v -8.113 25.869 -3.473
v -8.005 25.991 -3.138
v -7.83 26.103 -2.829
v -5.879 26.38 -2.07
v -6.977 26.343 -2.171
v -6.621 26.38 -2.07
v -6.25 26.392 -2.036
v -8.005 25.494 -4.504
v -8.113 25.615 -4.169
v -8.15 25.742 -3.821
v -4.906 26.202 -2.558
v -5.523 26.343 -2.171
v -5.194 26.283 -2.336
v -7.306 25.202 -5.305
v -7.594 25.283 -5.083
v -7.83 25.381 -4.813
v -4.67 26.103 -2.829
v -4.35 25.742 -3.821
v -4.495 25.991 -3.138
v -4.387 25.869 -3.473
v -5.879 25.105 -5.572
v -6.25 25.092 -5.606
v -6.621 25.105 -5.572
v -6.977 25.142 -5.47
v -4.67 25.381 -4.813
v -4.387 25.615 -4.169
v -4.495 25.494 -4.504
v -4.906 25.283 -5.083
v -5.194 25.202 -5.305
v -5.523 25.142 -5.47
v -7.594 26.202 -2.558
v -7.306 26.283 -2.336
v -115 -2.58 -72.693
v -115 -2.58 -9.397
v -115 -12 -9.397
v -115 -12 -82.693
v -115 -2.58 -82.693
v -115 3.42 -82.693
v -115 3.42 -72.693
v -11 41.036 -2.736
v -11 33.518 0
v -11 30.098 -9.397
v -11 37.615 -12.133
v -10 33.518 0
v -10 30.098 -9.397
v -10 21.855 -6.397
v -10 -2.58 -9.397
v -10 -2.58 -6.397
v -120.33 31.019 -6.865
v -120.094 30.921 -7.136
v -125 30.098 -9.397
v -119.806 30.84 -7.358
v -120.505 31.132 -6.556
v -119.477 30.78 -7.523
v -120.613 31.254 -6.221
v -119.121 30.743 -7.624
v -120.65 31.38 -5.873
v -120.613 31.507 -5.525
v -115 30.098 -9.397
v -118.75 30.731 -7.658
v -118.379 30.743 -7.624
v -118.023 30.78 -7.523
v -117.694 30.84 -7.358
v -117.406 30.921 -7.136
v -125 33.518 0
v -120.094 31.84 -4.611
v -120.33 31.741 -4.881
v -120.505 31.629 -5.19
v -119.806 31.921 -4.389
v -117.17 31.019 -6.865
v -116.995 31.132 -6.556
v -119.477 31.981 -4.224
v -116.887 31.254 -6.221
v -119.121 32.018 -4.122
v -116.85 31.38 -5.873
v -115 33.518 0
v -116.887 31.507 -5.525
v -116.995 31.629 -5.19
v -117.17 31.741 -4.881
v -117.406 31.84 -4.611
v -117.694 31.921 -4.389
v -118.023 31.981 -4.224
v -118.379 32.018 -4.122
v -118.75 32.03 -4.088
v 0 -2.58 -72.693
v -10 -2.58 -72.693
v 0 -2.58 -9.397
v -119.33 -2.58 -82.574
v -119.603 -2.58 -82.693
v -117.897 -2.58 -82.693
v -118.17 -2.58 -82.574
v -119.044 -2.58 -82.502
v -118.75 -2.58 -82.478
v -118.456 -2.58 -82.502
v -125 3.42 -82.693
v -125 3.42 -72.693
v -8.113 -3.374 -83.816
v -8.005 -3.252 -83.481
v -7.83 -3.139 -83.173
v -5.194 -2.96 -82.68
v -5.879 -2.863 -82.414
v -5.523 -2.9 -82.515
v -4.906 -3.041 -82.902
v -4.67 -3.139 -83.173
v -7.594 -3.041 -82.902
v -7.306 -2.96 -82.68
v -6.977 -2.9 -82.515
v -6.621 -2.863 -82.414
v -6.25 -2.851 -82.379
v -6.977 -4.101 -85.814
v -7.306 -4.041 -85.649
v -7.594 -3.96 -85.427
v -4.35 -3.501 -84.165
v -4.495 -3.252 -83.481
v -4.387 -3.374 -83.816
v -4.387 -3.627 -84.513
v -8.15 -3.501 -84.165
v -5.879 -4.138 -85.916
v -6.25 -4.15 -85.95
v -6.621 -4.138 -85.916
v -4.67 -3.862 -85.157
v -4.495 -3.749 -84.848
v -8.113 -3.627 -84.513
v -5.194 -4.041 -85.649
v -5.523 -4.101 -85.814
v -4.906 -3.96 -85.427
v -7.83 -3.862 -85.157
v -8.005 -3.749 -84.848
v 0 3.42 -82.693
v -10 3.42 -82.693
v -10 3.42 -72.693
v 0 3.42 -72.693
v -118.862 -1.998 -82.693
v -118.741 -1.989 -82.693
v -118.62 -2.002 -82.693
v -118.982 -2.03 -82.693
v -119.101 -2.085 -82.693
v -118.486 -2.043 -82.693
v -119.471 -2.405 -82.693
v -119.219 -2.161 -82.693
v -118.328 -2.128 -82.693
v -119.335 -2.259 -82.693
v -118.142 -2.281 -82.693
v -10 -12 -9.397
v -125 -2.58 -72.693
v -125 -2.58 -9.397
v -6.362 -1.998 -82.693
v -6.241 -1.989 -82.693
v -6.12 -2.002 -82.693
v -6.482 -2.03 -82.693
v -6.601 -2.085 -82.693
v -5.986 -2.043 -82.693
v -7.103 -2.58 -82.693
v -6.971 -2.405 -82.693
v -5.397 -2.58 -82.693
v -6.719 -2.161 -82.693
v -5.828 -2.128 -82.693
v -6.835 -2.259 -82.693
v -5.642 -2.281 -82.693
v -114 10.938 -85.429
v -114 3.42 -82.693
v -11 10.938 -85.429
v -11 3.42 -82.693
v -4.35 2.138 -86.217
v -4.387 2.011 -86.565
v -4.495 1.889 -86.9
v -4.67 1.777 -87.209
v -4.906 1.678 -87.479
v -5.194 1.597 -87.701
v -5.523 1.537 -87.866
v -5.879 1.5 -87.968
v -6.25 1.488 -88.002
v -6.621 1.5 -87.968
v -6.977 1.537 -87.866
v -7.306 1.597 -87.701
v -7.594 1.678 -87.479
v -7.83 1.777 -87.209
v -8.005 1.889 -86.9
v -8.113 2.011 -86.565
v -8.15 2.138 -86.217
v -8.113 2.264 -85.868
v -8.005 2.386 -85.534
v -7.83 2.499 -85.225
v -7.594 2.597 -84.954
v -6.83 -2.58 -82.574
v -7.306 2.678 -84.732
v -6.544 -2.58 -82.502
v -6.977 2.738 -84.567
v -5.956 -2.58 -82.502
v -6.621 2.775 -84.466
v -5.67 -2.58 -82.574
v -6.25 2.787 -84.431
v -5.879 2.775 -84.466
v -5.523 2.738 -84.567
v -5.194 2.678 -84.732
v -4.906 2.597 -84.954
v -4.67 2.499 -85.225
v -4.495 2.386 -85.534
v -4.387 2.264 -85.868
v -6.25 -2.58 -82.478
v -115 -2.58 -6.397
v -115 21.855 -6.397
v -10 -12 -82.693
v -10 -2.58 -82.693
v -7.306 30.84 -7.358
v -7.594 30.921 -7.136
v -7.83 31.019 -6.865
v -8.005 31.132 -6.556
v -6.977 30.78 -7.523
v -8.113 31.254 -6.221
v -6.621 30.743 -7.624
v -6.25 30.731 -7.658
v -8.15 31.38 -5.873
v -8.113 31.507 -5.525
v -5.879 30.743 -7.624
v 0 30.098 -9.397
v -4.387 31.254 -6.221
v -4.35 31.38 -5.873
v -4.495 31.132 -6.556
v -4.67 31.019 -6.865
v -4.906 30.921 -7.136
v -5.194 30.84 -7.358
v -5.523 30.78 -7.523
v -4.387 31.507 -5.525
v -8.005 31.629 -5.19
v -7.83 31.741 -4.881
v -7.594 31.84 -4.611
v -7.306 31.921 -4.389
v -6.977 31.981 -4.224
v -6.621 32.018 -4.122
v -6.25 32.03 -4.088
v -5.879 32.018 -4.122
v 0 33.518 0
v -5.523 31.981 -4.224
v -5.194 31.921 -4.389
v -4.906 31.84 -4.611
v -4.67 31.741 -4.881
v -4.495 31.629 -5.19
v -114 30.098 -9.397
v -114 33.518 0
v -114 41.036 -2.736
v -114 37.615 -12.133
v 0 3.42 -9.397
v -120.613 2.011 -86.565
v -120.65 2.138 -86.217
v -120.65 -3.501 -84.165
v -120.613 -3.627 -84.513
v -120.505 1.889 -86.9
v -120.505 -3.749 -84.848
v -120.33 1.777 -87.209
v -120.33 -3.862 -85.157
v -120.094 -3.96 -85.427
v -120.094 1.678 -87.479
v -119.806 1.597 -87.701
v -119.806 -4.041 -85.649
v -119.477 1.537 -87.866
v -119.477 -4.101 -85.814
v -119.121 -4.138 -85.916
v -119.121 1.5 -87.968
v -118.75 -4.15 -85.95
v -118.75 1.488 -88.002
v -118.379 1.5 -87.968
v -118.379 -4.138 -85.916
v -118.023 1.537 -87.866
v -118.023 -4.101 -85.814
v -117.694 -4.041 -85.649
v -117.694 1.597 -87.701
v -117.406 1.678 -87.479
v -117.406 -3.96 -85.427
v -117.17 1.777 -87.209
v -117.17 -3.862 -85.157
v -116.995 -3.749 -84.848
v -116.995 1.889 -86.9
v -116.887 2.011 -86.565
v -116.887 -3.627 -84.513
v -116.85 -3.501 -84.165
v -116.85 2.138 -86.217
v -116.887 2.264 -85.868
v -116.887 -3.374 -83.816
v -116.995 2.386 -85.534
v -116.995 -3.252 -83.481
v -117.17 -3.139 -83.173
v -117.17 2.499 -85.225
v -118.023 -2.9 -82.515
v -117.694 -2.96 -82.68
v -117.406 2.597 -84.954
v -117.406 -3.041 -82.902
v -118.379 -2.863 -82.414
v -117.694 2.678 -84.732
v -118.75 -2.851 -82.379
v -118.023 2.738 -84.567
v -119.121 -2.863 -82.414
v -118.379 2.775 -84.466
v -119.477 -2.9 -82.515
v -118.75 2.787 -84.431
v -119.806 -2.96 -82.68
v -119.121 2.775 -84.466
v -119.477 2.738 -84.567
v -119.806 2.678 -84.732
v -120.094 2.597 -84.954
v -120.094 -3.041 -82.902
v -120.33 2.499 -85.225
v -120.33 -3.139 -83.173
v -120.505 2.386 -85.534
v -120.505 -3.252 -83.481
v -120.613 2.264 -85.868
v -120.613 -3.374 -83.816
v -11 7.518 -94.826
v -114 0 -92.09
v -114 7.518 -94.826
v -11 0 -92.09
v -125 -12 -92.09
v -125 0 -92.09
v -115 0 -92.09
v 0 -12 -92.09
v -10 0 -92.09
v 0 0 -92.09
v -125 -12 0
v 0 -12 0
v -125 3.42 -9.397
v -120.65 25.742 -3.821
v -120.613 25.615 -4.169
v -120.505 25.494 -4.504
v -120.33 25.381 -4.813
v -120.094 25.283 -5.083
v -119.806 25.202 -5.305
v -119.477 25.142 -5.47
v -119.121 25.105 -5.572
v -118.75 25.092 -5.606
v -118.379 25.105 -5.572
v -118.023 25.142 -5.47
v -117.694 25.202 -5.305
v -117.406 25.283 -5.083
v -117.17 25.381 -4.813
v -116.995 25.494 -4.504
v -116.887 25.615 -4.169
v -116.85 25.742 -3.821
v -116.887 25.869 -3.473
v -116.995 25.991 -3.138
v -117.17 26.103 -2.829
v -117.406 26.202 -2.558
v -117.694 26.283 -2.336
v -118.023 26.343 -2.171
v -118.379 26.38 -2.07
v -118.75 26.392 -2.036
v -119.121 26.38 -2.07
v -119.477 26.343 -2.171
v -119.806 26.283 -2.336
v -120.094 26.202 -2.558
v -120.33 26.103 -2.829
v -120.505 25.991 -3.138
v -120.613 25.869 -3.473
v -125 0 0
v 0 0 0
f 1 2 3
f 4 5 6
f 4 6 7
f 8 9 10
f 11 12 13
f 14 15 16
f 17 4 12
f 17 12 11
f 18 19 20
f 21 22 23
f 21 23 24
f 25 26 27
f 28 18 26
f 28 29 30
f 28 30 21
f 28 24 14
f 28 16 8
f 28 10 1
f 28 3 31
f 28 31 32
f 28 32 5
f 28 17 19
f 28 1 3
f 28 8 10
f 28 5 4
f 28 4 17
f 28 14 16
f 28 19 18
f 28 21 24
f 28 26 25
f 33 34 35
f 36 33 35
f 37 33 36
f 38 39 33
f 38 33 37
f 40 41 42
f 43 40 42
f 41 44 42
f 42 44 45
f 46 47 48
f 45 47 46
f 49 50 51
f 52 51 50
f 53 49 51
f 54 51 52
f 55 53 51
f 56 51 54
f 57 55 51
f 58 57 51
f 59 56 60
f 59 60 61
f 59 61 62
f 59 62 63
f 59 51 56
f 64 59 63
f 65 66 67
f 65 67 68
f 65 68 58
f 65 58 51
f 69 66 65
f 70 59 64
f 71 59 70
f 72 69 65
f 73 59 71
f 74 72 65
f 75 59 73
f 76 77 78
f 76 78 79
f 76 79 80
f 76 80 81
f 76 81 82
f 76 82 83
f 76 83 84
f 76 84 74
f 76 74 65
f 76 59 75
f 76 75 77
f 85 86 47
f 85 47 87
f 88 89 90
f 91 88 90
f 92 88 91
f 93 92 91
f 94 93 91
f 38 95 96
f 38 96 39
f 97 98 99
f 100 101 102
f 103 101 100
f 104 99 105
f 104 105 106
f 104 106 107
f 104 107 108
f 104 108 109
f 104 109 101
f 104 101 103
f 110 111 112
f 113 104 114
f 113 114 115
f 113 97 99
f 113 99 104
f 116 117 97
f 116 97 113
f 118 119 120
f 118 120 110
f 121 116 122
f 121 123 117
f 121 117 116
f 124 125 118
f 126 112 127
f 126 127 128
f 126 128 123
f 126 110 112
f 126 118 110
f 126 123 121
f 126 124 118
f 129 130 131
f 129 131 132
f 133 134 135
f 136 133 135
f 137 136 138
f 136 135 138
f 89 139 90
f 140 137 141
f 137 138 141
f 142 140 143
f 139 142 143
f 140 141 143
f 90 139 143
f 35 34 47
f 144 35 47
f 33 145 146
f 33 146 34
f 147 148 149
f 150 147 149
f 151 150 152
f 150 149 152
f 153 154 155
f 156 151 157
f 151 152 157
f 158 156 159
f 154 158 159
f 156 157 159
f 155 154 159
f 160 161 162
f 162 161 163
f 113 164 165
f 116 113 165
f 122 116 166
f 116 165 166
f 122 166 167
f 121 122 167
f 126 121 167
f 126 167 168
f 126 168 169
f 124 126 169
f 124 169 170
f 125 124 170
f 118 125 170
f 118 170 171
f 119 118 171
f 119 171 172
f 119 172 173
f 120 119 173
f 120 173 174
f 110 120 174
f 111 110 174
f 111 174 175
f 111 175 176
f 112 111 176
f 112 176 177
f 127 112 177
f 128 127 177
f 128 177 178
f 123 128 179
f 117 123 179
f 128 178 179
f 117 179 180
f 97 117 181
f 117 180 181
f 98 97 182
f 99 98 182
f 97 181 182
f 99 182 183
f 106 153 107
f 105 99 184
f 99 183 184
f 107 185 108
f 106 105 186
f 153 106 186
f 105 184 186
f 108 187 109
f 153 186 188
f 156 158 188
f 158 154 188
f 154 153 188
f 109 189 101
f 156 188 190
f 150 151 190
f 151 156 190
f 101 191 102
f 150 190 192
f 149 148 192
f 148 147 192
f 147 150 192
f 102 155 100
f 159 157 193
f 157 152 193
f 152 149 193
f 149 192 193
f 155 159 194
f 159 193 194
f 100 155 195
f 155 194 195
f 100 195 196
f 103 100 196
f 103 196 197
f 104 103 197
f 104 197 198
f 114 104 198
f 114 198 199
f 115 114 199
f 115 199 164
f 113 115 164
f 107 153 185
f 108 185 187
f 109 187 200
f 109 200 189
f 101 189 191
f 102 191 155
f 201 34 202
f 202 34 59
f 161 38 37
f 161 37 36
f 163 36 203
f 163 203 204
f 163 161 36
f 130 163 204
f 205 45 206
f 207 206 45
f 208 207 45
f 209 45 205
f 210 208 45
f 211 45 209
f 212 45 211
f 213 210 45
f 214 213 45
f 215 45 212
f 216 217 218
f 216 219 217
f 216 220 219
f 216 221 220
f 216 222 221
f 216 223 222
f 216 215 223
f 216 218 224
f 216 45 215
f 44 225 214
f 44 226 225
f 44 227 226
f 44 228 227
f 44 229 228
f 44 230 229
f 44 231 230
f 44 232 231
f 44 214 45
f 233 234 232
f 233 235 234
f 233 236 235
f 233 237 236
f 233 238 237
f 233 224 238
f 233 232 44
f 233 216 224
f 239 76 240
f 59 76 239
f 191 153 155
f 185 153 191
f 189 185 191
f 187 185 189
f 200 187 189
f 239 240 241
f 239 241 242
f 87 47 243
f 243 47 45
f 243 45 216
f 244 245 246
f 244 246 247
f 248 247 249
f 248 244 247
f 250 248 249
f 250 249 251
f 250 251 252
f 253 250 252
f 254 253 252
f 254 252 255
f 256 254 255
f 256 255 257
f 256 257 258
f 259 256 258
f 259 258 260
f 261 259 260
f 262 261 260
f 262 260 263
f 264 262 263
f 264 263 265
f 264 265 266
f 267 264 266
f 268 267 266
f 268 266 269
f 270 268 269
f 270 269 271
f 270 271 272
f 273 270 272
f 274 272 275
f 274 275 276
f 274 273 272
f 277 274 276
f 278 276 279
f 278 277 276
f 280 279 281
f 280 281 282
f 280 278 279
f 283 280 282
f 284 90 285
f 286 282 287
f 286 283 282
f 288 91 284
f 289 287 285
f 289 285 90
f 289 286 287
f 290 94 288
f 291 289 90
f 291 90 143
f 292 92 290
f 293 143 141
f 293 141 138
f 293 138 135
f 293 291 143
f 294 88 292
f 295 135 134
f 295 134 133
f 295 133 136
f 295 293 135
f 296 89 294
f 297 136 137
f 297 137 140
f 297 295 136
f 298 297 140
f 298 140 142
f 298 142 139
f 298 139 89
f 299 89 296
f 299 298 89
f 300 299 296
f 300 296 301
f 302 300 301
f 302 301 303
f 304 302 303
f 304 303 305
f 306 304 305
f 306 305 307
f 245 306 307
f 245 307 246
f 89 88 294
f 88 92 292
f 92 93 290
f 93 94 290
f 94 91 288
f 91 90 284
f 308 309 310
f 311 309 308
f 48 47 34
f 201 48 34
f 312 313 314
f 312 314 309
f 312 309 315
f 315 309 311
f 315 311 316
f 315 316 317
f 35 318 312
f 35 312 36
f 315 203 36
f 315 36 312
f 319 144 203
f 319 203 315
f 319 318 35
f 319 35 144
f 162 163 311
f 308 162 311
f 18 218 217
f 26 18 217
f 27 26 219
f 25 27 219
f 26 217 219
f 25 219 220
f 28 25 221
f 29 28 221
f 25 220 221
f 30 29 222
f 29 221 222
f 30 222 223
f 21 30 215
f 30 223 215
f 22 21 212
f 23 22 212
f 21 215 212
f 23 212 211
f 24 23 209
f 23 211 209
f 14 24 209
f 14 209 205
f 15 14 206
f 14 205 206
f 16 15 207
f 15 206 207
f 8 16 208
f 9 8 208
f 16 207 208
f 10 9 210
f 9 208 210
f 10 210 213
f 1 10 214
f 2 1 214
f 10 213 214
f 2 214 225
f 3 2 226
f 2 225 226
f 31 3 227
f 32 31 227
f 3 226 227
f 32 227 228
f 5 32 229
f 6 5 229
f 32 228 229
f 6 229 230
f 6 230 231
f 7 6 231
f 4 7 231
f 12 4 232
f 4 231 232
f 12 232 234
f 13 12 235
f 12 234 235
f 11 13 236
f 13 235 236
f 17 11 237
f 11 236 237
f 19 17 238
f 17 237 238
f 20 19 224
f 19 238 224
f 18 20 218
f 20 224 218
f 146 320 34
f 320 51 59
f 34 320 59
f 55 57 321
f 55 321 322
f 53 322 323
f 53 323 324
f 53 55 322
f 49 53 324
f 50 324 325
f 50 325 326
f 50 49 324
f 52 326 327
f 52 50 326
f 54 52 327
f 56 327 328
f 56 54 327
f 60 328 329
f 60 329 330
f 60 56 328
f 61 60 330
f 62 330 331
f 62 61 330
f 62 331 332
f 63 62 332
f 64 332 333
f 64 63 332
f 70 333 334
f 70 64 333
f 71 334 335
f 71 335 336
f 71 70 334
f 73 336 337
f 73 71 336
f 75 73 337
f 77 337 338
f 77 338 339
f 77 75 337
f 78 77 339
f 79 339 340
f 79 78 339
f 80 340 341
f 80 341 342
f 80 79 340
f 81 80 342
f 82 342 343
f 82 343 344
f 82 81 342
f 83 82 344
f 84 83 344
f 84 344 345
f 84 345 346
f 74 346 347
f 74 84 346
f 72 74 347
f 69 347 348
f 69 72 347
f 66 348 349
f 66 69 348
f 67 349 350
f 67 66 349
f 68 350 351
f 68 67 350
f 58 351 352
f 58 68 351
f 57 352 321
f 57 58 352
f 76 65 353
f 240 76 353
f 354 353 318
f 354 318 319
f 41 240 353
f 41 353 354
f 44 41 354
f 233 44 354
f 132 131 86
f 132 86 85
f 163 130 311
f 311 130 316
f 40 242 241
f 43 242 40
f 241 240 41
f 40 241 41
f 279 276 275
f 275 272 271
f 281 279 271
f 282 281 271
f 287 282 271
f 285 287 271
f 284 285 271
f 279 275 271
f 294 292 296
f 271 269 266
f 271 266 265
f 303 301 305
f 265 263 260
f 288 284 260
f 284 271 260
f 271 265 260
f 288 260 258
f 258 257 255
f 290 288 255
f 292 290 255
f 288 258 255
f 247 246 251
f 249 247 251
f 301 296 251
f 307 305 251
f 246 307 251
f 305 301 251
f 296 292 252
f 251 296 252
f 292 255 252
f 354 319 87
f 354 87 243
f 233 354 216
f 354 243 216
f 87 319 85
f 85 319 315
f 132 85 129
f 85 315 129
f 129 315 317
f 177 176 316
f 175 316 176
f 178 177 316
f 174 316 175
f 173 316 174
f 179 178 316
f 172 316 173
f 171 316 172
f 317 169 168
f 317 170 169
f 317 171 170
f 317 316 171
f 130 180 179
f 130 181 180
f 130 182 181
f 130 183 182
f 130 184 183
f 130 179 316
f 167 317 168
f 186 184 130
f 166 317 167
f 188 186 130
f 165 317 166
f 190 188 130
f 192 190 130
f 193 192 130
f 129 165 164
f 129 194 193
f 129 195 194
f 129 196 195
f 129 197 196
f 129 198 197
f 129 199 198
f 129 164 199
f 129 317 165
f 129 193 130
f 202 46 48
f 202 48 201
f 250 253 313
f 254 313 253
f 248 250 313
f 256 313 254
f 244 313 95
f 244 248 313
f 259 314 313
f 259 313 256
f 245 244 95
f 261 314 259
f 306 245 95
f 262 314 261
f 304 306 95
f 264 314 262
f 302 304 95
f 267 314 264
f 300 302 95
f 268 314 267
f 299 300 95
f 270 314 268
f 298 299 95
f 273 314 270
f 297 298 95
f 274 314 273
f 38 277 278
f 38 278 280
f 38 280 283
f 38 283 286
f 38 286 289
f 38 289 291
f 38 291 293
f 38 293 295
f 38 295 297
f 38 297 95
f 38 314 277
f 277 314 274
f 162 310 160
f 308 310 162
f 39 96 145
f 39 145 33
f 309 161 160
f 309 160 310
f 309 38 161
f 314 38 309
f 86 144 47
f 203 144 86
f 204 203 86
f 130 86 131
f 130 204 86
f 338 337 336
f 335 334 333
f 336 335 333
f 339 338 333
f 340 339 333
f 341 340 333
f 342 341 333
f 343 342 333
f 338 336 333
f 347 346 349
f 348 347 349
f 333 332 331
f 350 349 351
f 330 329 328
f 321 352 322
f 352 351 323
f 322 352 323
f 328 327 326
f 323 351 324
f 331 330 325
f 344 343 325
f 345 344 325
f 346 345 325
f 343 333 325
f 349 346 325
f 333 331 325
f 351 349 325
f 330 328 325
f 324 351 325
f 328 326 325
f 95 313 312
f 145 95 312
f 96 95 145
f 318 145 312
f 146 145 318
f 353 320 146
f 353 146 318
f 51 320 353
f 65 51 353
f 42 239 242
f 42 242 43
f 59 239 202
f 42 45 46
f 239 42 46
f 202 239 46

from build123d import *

# Parameters (mm, degrees)
BOSS_EXTRUDE3_DEPTH  = 125
SKETCH3_W            = 125
SKETCH3_H            = 92.089876837
BOSS_EXTRUDE5_DEPTH  = 12
CUT_EXTRUDE1_DEPTH   = 126
SKETCH7_W            = 105
SKETCH7_H            = 10
BOSS_EXTRUDE6_DEPTH  = 8
SKETCH8_W            = 105
SKETCH8_H            = 10
BOSS_EXTRUDE7_DEPTH  = 8
SKETCH9_W            = 105
SKETCH9_H            = 73.296024421
CUT_EXTRUDE2_DEPTH   = 16.420201433
SKETCH11_W           = 10
SKETCH11_H           = 73.296024421
CUT_EXTRUDE3_DEPTH   = 6
SKETCH12_W           = 10
SKETCH12_H           = 73.296024421
CUT_EXTRUDE4_DEPTH   = 6
SKETCH13_W           = 105
SKETCH13_H           = 32.67757118
CUT_EXTRUDE6_DEPTH   = 3
SKETCH14_R           = 1.9
CUT_EXTRUDE8_DEPTH   = 6
SKETCH15_R           = 1.9
CUT_EXTRUDE9_DEPTH   = 6
BOSS_EXTRUDE9_REACH  = 117
SKETCH25_W           = 10
SKETCH25_H           = 6
BOSS_EXTRUDE13_DEPTH = 10
CUT_EXTRUDE10_DEPTH  = 1
CUT_EXTRUDE11_DEPTH  = 1


with BuildPart() as part:
    # Sketch1 → Boss-Extrude3 (new body)
    with BuildSketch(Plane(origin=(0, 0, 0), x_dir=(0, 0, -1), z_dir=(1, 0, 0))):
        Polygon((0, 0), (92.089876837, 0), (0, 33.517974046), align=None)
    extrude(amount=-BOSS_EXTRUDE3_DEPTH)

    # Sketch3 → Boss-Extrude5 (add)
    with BuildSketch(Plane.XZ):
        with Locations((-62.5, -46.044938419)):
            Rectangle(SKETCH3_W, SKETCH3_H)
    extrude(amount=BOSS_EXTRUDE5_DEPTH)

    # Sketch6 → Cut-Extrude1 (cut, through all)
    with BuildSketch(Plane.ZY.offset(125)):
        Polygon((-9.396926208, 30.097772613), (-82.692950629, 3.420201433), (-9.396926208, 3.420201433), align=None)
    extrude(amount=-CUT_EXTRUDE1_DEPTH, mode=Mode.SUBTRACT)

    # Sketch7 → Boss-Extrude6 (add)
    with BuildSketch(Plane(origin=(0, 29.597115904, -10.772469209), x_dir=(1, 0, 0), z_dir=(0, 0.939692621, -0.342020143))):
        with Locations((-62.5, 81.536177713)):
            Rectangle(SKETCH7_W, SKETCH7_H)
    extrude(amount=BOSS_EXTRUDE6_DEPTH)

    # Sketch8 → Boss-Extrude7 (add)
    with BuildSketch(Plane(origin=(0, 29.597115904, -10.772469209), x_dir=(1, 0, 0), z_dir=(0, 0.939692621, -0.342020143))):
        with Locations((-62.5, -6.463822287)):
            Rectangle(SKETCH8_W, SKETCH8_H)
    extrude(amount=BOSS_EXTRUDE7_DEPTH)

    # Sketch9 → Cut-Extrude2 (cut, through all)
    with BuildSketch(Plane(origin=(0, 3.420201433, 0), x_dir=(1, 0, 0), z_dir=(0, 1, 0))):
        with Locations((-62.5, 46.044938419)):
            Rectangle(SKETCH9_W, SKETCH9_H)
    extrude(amount=-CUT_EXTRUDE2_DEPTH, mode=Mode.SUBTRACT)

    # Sketch11 → Cut-Extrude3 (cut)
    with BuildSketch(Plane(origin=(0, 3.420201433, 0), x_dir=(1, 0, 0), z_dir=(0, 1, 0))):
        with Locations((-5, 46.044938419)):
            Rectangle(SKETCH11_W, SKETCH11_H)
    extrude(amount=-CUT_EXTRUDE3_DEPTH, mode=Mode.SUBTRACT)

    # Sketch12 → Cut-Extrude4 (cut)
    with BuildSketch(Plane(origin=(0, 3.420201433, 0), x_dir=(1, 0, 0), z_dir=(0, 1, 0))):
        with Locations((-120, 46.044938419)):
            Rectangle(SKETCH12_W, SKETCH12_H)
    extrude(amount=-CUT_EXTRUDE4_DEPTH, mode=Mode.SUBTRACT)

    # Sketch13 → Cut-Extrude6 (cut)
    with BuildSketch(Plane(origin=(0, 0, -9.396926208), x_dir=(-1, 0, 0), z_dir=(0, 0, -1))):
        with Locations((62.5, 13.758987023)):
            Rectangle(SKETCH13_W, SKETCH13_H)
    extrude(amount=-CUT_EXTRUDE6_DEPTH, mode=Mode.SUBTRACT)

    # Sketch14 → Cut-Extrude8 (cut)
    with BuildSketch(Plane(origin=(0, 29.597115904, -10.772469209), x_dir=(1, 0, 0), z_dir=(0, 0.939692621, -0.342020143))):
        with Locations((-6.25, 80.286177713)):
            Circle(SKETCH14_R)
    cut_extrude8 = extrude(amount=-CUT_EXTRUDE8_DEPTH, mode=Mode.SUBTRACT)

    # Mirror1: Cut-Extrude8 across plane
    add(cut_extrude8.mirror(Plane(origin=(-62.5, 0, 0), x_dir=(0, 0, 1), z_dir=(1, 0, 0))), mode=Mode.SUBTRACT)

    # Sketch15 → Cut-Extrude9 (cut)
    with BuildSketch(Plane(origin=(0, 29.597115904, -10.772469209), x_dir=(1, 0, 0), z_dir=(0, 0.939692621, -0.342020143))):
        with Locations((-6.25, -5.213822287)):
            Circle(SKETCH15_R)
    cut_extrude9 = extrude(amount=-CUT_EXTRUDE9_DEPTH, mode=Mode.SUBTRACT)

    # Mirror2: Cut-Extrude9 across plane
    add(cut_extrude9.mirror(Plane(origin=(-62.5, 0, 0), x_dir=(0, 0, 1), z_dir=(1, 0, 0))), mode=Mode.SUBTRACT)

    # Sketch22 → Boss-Extrude9 (add, up to next)
    with BuildSketch(Plane.ZY.offset(10), mode=Mode.PRIVATE) as boss_extrude9_sk1:
        Polygon((-9.396926208, 30.097772613), (-6.396926208, 21.855340354), (-6.396926208, 30.097772613), align=None)
    boss_extrude9_tool1 = extrude(boss_extrude9_sk1.sketch, amount=BOSS_EXTRUDE9_REACH, mode=Mode.PRIVATE) - part.part
    add(boss_extrude9_tool1.solids().sort_by_distance((-10, 27.350295, -7.396926))[0])

    # Sketch25 → Boss-Extrude13 (add)
    with BuildSketch(Plane.XY.offset(-82.692950629)):
        with Locations((-5, 0.420201433)):
            Rectangle(SKETCH25_W, SKETCH25_H)
        with Locations((-120, 0.420201433)):
            Rectangle(SKETCH25_W, SKETCH25_H)
    extrude(amount=BOSS_EXTRUDE13_DEPTH)

    # Sketch26 → Cut-Extrude10 (cut)
    with BuildSketch(Plane(origin=(-10, 0, 0), x_dir=(0, 0, -1), z_dir=(1, 0, 0))):
        Polygon((0, 33.517974046), (9.396926208, 30.097772613), (12.133087354, 37.615313579), (2.736161147, 41.035515012), align=None)
    cut_extrude10 = extrude(amount=-CUT_EXTRUDE10_DEPTH, mode=Mode.SUBTRACT)

    # Sketch27 → Cut-Extrude11 (cut)
    with BuildSketch(Plane(origin=(-10, 0, 0), x_dir=(0, 0, -1), z_dir=(1, 0, 0))):
        Polygon((82.692950629, 3.420201433), (92.089876837, 0), (94.826037984, 7.517540966), (85.429111776, 10.9377424), align=None)
    cut_extrude11 = extrude(amount=-CUT_EXTRUDE11_DEPTH, mode=Mode.SUBTRACT)

    # Mirror3: Cut-Extrude10, Cut-Extrude11 across plane
    add(cut_extrude10.mirror(Plane(origin=(-62.5, 0, 0), x_dir=(0, 0, 1), z_dir=(1, 0, 0))), mode=Mode.SUBTRACT)
    add(cut_extrude11.mirror(Plane(origin=(-62.5, 0, 0), x_dir=(0, 0, 1), z_dir=(1, 0, 0))), mode=Mode.SUBTRACT)


solid = part.part
